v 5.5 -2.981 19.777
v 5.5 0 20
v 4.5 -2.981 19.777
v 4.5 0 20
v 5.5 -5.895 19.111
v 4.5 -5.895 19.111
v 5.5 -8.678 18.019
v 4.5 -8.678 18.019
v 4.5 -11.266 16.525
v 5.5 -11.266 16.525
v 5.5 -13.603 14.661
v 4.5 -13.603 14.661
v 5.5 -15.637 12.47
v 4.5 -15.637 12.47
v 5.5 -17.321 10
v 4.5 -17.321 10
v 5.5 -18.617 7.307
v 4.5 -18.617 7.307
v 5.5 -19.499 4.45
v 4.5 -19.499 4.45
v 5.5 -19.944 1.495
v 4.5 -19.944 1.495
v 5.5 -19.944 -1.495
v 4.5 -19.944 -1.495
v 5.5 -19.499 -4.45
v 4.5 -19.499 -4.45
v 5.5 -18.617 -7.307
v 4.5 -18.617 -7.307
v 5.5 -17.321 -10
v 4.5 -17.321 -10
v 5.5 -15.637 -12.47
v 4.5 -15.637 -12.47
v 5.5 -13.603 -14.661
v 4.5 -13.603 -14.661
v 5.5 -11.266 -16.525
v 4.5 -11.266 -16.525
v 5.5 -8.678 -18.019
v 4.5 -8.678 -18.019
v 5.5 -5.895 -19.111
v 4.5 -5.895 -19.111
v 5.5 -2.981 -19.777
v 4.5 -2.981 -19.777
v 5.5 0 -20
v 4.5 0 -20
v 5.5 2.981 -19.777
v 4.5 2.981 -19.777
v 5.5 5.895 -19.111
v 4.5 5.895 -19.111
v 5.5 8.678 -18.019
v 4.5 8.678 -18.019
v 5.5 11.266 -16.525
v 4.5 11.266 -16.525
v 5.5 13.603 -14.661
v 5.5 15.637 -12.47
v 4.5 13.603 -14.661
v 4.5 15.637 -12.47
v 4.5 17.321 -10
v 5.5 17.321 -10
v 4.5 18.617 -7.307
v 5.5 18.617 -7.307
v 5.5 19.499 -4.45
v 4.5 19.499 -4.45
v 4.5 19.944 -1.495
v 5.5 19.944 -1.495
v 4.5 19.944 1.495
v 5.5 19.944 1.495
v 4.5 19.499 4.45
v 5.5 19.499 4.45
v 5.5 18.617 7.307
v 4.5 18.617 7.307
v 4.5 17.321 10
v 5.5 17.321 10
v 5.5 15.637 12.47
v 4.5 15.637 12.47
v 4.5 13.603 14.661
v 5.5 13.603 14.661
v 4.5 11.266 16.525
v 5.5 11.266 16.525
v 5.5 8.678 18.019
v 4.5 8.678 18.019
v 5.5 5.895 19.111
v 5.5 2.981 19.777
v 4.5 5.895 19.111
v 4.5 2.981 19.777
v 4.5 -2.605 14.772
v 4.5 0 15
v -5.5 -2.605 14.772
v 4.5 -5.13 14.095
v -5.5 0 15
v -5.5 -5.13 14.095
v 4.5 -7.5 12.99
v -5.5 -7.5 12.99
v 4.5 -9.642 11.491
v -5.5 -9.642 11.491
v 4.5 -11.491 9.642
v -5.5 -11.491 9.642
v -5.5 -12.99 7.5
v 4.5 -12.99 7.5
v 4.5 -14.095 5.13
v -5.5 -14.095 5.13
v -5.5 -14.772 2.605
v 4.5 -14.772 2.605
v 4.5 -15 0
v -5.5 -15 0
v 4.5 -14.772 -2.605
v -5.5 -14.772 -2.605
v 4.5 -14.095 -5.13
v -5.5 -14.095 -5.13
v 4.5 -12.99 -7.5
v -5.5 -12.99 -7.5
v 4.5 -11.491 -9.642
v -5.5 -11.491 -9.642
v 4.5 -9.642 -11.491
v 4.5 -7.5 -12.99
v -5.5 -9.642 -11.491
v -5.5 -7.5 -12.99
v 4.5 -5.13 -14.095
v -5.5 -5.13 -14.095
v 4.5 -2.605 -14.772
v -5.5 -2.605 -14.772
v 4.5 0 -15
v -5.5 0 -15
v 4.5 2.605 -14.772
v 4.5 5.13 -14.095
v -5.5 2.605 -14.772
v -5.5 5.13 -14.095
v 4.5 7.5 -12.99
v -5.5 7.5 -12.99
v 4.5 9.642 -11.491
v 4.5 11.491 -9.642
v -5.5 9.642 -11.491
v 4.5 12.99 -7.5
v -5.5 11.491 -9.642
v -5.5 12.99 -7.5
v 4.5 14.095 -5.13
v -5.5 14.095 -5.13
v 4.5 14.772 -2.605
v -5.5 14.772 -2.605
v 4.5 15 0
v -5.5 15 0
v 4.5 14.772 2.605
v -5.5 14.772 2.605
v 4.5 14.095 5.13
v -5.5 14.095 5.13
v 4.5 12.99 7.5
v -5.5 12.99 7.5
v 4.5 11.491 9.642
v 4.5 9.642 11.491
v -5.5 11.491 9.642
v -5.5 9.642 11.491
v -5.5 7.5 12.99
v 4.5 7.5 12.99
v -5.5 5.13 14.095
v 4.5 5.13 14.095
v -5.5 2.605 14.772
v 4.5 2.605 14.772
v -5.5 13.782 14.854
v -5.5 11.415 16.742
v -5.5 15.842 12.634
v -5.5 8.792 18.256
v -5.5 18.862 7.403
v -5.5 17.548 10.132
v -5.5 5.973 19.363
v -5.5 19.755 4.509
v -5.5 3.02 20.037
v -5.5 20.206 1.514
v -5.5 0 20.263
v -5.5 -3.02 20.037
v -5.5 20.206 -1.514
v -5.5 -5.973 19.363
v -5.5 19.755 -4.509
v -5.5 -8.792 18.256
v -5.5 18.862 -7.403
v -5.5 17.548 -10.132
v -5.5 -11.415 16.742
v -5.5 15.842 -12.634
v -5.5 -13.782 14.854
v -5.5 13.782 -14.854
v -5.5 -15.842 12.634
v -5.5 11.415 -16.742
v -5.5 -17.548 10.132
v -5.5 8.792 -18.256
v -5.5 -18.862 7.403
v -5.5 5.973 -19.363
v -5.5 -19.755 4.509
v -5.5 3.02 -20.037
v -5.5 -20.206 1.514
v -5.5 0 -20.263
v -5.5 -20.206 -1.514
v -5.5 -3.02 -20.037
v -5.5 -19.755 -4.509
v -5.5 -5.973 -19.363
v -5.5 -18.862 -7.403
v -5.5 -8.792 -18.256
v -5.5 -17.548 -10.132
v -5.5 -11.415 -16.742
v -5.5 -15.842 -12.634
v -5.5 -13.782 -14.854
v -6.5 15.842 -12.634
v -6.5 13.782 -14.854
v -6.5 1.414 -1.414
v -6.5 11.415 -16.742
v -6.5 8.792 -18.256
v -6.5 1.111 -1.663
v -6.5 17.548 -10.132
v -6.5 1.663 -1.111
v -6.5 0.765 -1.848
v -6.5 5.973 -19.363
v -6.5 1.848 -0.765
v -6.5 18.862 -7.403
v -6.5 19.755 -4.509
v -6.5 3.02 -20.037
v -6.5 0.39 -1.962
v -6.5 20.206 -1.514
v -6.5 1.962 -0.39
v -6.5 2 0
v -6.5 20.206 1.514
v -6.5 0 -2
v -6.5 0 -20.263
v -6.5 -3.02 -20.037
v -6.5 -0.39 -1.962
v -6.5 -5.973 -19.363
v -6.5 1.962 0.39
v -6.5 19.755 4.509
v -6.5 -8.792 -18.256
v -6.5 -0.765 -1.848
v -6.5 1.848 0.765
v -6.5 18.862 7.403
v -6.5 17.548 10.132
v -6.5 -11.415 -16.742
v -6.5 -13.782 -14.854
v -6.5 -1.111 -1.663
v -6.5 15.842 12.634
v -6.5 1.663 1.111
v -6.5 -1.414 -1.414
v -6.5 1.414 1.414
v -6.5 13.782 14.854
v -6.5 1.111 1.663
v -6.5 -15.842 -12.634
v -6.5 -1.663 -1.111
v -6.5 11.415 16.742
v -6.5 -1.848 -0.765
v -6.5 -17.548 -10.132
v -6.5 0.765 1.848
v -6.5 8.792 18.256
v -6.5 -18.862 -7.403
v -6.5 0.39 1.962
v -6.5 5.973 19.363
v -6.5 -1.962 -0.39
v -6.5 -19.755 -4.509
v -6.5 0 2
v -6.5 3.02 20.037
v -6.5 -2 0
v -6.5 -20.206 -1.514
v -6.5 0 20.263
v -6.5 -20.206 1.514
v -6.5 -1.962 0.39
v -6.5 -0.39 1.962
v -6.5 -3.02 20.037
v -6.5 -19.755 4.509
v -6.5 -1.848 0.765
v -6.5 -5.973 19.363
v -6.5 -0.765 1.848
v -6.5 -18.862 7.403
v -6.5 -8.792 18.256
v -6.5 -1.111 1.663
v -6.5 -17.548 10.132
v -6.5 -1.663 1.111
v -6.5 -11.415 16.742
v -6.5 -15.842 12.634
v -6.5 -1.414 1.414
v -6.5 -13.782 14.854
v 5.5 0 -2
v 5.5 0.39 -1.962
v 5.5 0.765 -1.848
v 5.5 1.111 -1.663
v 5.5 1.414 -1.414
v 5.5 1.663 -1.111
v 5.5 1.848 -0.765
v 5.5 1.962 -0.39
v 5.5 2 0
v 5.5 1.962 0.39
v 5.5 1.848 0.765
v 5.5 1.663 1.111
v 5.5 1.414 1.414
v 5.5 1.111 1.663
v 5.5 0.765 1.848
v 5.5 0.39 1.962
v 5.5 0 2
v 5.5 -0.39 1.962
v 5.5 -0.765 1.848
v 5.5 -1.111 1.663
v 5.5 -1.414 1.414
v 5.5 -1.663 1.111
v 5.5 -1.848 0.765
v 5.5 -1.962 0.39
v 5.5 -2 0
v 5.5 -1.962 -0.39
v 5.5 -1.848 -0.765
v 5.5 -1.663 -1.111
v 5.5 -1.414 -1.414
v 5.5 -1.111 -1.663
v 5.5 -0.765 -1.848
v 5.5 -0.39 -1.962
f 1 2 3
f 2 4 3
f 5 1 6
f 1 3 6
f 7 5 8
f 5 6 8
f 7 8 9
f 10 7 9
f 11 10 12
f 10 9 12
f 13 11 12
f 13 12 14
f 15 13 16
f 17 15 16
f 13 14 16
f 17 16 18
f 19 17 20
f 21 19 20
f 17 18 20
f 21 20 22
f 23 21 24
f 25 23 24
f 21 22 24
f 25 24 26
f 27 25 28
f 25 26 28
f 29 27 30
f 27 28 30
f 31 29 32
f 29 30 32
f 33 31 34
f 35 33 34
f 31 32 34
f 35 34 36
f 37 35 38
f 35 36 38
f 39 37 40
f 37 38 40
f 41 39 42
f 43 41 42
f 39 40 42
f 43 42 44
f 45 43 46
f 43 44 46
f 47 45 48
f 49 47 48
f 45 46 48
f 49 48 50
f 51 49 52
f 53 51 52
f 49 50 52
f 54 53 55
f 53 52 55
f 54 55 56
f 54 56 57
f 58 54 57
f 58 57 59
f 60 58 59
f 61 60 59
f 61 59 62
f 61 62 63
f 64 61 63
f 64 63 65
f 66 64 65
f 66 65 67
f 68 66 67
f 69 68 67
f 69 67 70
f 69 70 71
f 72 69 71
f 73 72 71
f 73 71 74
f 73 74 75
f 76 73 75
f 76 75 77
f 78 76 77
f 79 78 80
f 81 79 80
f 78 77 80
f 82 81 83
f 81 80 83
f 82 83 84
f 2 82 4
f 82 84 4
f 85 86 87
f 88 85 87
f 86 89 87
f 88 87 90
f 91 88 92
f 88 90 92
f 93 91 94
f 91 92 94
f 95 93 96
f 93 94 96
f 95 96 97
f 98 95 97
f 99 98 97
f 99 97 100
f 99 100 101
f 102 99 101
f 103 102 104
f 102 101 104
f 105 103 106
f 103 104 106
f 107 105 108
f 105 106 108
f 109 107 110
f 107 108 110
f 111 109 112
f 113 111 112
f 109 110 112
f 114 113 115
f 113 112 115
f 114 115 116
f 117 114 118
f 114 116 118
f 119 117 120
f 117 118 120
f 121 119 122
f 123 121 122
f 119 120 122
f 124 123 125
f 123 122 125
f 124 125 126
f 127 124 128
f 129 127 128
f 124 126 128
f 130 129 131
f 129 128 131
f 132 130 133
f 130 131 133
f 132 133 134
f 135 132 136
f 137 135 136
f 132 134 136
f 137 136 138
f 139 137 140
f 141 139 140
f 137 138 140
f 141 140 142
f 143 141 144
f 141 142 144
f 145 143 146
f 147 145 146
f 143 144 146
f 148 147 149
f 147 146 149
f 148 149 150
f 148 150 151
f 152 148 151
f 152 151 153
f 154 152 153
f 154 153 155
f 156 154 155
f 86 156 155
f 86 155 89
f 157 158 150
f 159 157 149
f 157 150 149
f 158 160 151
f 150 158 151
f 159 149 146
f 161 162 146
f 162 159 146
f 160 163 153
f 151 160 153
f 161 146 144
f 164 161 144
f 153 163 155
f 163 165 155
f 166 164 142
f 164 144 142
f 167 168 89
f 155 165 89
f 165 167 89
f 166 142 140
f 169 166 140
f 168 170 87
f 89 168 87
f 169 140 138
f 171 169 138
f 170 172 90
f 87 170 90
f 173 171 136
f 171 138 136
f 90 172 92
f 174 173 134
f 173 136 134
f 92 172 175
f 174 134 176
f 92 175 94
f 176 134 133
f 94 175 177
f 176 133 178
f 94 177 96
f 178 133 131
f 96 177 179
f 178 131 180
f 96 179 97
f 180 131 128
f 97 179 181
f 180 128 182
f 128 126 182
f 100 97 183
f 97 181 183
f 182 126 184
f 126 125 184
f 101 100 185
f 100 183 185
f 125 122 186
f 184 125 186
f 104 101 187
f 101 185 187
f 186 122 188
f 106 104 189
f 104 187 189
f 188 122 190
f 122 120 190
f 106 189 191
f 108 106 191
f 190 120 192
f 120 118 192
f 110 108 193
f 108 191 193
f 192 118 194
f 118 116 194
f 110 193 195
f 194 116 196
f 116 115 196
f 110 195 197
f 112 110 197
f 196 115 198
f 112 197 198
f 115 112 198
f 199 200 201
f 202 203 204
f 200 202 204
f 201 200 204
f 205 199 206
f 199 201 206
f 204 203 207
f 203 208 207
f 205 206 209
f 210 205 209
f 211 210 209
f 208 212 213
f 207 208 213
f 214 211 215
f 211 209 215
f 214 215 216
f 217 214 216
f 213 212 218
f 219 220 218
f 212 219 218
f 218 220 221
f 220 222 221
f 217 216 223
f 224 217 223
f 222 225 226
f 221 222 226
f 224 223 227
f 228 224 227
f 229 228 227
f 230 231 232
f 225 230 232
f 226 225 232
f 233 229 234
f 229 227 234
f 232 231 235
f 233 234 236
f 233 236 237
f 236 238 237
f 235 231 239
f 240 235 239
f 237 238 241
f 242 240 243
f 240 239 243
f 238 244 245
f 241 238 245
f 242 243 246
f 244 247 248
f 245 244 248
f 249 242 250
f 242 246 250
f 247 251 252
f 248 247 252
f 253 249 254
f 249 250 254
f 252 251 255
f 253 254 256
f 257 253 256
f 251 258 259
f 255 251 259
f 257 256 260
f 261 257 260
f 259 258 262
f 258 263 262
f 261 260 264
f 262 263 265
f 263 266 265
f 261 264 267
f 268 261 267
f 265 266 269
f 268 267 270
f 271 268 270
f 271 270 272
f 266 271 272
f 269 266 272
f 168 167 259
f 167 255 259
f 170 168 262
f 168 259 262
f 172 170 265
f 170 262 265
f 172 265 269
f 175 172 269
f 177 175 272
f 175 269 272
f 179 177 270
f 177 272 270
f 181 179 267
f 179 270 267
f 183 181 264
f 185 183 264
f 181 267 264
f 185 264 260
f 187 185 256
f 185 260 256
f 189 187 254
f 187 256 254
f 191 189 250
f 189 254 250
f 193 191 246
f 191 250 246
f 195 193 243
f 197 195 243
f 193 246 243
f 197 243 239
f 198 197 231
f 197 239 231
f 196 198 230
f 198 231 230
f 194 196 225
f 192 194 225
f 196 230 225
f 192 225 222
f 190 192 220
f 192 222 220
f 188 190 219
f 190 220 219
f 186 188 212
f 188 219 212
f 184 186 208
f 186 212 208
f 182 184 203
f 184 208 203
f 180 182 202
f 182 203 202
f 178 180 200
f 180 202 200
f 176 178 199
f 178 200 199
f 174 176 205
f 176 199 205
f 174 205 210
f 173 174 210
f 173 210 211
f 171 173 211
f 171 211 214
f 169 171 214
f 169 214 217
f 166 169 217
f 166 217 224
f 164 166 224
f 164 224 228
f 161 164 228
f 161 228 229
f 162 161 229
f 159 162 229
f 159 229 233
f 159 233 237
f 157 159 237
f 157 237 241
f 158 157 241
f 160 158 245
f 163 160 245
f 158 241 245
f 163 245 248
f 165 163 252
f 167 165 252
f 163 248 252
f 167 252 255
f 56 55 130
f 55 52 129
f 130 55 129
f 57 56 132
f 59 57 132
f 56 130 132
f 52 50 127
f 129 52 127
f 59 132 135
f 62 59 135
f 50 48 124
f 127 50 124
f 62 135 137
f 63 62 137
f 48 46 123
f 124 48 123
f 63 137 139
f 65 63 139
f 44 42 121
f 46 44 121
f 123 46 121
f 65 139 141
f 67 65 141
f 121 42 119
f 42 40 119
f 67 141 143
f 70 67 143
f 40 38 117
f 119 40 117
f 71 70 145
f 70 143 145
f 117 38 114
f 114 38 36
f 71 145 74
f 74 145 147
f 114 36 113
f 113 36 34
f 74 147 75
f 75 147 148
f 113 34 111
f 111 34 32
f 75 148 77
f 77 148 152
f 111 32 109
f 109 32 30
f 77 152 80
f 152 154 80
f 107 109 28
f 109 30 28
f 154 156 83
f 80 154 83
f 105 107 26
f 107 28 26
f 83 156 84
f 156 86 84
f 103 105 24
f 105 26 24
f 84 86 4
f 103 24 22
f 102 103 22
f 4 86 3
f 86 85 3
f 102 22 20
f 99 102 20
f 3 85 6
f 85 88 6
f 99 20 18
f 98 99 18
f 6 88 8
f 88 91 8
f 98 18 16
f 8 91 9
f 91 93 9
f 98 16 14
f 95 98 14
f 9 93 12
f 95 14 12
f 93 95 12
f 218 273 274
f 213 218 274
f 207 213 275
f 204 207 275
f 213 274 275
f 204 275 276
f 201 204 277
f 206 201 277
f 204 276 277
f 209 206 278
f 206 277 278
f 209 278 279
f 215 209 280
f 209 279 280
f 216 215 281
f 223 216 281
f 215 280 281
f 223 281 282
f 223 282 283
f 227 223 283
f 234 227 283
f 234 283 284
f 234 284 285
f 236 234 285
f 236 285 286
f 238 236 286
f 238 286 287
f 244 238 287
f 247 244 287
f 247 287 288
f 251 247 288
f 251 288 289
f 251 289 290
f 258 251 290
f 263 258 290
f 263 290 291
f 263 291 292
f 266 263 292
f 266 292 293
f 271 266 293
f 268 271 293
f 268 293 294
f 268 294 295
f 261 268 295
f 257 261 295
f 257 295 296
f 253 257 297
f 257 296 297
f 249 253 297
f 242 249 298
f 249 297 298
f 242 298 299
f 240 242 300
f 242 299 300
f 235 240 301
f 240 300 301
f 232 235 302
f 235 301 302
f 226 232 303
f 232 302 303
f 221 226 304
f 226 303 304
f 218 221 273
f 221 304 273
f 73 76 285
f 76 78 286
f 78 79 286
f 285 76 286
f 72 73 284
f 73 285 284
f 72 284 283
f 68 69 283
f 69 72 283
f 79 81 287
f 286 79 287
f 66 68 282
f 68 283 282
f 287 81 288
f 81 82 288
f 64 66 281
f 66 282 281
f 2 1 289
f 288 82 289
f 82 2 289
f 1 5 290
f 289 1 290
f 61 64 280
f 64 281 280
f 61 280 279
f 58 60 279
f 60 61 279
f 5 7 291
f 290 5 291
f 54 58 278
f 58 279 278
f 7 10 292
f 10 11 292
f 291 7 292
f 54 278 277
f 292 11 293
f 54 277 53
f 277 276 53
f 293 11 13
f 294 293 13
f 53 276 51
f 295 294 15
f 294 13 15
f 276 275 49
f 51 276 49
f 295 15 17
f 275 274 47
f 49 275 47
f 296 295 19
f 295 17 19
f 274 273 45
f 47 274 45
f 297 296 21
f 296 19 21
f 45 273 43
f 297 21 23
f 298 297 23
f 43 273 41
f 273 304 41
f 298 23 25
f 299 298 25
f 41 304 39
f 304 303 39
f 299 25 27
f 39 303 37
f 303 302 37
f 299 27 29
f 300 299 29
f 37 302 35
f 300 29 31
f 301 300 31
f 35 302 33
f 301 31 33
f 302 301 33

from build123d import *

# Parameters (mm, degrees)
ESQUISSE2_R             = 2
ENL_V_MAT_EXTRU_1_DEPTH = 32.06752542


with BuildPart() as part:
    # Esquisse1 → Révolution1 (revolve)
    with BuildSketch(Plane.XY, mode=Mode.PRIVATE) as r_volution1_sk:
        Polygon((0, 0), (5.5, 0), (5.5, 20), (4.5, 20), (4.5, 15), (-5.5, 15), (-5.5, 20.263157895), (-6.5, 20.263157895), (-6.5, 0), align=None)
    revolve(r_volution1_sk.sketch.rotate(Axis((-6.5, 0, 0), (1, 0, 0)), 90), axis=Axis((-6.5, 0, 0), (1, 0, 0)))

    # Esquisse2 → Enlèv. mat.-Extru.1 (cut, through all)
    with BuildSketch(Plane(origin=(5.5, 0, 0), x_dir=(0, 0, -1), z_dir=(1, 0, 0))):
        Circle(ESQUISSE2_R)
    extrude(amount=-ENL_V_MAT_EXTRU_1_DEPTH, mode=Mode.SUBTRACT)


solid = part.part
